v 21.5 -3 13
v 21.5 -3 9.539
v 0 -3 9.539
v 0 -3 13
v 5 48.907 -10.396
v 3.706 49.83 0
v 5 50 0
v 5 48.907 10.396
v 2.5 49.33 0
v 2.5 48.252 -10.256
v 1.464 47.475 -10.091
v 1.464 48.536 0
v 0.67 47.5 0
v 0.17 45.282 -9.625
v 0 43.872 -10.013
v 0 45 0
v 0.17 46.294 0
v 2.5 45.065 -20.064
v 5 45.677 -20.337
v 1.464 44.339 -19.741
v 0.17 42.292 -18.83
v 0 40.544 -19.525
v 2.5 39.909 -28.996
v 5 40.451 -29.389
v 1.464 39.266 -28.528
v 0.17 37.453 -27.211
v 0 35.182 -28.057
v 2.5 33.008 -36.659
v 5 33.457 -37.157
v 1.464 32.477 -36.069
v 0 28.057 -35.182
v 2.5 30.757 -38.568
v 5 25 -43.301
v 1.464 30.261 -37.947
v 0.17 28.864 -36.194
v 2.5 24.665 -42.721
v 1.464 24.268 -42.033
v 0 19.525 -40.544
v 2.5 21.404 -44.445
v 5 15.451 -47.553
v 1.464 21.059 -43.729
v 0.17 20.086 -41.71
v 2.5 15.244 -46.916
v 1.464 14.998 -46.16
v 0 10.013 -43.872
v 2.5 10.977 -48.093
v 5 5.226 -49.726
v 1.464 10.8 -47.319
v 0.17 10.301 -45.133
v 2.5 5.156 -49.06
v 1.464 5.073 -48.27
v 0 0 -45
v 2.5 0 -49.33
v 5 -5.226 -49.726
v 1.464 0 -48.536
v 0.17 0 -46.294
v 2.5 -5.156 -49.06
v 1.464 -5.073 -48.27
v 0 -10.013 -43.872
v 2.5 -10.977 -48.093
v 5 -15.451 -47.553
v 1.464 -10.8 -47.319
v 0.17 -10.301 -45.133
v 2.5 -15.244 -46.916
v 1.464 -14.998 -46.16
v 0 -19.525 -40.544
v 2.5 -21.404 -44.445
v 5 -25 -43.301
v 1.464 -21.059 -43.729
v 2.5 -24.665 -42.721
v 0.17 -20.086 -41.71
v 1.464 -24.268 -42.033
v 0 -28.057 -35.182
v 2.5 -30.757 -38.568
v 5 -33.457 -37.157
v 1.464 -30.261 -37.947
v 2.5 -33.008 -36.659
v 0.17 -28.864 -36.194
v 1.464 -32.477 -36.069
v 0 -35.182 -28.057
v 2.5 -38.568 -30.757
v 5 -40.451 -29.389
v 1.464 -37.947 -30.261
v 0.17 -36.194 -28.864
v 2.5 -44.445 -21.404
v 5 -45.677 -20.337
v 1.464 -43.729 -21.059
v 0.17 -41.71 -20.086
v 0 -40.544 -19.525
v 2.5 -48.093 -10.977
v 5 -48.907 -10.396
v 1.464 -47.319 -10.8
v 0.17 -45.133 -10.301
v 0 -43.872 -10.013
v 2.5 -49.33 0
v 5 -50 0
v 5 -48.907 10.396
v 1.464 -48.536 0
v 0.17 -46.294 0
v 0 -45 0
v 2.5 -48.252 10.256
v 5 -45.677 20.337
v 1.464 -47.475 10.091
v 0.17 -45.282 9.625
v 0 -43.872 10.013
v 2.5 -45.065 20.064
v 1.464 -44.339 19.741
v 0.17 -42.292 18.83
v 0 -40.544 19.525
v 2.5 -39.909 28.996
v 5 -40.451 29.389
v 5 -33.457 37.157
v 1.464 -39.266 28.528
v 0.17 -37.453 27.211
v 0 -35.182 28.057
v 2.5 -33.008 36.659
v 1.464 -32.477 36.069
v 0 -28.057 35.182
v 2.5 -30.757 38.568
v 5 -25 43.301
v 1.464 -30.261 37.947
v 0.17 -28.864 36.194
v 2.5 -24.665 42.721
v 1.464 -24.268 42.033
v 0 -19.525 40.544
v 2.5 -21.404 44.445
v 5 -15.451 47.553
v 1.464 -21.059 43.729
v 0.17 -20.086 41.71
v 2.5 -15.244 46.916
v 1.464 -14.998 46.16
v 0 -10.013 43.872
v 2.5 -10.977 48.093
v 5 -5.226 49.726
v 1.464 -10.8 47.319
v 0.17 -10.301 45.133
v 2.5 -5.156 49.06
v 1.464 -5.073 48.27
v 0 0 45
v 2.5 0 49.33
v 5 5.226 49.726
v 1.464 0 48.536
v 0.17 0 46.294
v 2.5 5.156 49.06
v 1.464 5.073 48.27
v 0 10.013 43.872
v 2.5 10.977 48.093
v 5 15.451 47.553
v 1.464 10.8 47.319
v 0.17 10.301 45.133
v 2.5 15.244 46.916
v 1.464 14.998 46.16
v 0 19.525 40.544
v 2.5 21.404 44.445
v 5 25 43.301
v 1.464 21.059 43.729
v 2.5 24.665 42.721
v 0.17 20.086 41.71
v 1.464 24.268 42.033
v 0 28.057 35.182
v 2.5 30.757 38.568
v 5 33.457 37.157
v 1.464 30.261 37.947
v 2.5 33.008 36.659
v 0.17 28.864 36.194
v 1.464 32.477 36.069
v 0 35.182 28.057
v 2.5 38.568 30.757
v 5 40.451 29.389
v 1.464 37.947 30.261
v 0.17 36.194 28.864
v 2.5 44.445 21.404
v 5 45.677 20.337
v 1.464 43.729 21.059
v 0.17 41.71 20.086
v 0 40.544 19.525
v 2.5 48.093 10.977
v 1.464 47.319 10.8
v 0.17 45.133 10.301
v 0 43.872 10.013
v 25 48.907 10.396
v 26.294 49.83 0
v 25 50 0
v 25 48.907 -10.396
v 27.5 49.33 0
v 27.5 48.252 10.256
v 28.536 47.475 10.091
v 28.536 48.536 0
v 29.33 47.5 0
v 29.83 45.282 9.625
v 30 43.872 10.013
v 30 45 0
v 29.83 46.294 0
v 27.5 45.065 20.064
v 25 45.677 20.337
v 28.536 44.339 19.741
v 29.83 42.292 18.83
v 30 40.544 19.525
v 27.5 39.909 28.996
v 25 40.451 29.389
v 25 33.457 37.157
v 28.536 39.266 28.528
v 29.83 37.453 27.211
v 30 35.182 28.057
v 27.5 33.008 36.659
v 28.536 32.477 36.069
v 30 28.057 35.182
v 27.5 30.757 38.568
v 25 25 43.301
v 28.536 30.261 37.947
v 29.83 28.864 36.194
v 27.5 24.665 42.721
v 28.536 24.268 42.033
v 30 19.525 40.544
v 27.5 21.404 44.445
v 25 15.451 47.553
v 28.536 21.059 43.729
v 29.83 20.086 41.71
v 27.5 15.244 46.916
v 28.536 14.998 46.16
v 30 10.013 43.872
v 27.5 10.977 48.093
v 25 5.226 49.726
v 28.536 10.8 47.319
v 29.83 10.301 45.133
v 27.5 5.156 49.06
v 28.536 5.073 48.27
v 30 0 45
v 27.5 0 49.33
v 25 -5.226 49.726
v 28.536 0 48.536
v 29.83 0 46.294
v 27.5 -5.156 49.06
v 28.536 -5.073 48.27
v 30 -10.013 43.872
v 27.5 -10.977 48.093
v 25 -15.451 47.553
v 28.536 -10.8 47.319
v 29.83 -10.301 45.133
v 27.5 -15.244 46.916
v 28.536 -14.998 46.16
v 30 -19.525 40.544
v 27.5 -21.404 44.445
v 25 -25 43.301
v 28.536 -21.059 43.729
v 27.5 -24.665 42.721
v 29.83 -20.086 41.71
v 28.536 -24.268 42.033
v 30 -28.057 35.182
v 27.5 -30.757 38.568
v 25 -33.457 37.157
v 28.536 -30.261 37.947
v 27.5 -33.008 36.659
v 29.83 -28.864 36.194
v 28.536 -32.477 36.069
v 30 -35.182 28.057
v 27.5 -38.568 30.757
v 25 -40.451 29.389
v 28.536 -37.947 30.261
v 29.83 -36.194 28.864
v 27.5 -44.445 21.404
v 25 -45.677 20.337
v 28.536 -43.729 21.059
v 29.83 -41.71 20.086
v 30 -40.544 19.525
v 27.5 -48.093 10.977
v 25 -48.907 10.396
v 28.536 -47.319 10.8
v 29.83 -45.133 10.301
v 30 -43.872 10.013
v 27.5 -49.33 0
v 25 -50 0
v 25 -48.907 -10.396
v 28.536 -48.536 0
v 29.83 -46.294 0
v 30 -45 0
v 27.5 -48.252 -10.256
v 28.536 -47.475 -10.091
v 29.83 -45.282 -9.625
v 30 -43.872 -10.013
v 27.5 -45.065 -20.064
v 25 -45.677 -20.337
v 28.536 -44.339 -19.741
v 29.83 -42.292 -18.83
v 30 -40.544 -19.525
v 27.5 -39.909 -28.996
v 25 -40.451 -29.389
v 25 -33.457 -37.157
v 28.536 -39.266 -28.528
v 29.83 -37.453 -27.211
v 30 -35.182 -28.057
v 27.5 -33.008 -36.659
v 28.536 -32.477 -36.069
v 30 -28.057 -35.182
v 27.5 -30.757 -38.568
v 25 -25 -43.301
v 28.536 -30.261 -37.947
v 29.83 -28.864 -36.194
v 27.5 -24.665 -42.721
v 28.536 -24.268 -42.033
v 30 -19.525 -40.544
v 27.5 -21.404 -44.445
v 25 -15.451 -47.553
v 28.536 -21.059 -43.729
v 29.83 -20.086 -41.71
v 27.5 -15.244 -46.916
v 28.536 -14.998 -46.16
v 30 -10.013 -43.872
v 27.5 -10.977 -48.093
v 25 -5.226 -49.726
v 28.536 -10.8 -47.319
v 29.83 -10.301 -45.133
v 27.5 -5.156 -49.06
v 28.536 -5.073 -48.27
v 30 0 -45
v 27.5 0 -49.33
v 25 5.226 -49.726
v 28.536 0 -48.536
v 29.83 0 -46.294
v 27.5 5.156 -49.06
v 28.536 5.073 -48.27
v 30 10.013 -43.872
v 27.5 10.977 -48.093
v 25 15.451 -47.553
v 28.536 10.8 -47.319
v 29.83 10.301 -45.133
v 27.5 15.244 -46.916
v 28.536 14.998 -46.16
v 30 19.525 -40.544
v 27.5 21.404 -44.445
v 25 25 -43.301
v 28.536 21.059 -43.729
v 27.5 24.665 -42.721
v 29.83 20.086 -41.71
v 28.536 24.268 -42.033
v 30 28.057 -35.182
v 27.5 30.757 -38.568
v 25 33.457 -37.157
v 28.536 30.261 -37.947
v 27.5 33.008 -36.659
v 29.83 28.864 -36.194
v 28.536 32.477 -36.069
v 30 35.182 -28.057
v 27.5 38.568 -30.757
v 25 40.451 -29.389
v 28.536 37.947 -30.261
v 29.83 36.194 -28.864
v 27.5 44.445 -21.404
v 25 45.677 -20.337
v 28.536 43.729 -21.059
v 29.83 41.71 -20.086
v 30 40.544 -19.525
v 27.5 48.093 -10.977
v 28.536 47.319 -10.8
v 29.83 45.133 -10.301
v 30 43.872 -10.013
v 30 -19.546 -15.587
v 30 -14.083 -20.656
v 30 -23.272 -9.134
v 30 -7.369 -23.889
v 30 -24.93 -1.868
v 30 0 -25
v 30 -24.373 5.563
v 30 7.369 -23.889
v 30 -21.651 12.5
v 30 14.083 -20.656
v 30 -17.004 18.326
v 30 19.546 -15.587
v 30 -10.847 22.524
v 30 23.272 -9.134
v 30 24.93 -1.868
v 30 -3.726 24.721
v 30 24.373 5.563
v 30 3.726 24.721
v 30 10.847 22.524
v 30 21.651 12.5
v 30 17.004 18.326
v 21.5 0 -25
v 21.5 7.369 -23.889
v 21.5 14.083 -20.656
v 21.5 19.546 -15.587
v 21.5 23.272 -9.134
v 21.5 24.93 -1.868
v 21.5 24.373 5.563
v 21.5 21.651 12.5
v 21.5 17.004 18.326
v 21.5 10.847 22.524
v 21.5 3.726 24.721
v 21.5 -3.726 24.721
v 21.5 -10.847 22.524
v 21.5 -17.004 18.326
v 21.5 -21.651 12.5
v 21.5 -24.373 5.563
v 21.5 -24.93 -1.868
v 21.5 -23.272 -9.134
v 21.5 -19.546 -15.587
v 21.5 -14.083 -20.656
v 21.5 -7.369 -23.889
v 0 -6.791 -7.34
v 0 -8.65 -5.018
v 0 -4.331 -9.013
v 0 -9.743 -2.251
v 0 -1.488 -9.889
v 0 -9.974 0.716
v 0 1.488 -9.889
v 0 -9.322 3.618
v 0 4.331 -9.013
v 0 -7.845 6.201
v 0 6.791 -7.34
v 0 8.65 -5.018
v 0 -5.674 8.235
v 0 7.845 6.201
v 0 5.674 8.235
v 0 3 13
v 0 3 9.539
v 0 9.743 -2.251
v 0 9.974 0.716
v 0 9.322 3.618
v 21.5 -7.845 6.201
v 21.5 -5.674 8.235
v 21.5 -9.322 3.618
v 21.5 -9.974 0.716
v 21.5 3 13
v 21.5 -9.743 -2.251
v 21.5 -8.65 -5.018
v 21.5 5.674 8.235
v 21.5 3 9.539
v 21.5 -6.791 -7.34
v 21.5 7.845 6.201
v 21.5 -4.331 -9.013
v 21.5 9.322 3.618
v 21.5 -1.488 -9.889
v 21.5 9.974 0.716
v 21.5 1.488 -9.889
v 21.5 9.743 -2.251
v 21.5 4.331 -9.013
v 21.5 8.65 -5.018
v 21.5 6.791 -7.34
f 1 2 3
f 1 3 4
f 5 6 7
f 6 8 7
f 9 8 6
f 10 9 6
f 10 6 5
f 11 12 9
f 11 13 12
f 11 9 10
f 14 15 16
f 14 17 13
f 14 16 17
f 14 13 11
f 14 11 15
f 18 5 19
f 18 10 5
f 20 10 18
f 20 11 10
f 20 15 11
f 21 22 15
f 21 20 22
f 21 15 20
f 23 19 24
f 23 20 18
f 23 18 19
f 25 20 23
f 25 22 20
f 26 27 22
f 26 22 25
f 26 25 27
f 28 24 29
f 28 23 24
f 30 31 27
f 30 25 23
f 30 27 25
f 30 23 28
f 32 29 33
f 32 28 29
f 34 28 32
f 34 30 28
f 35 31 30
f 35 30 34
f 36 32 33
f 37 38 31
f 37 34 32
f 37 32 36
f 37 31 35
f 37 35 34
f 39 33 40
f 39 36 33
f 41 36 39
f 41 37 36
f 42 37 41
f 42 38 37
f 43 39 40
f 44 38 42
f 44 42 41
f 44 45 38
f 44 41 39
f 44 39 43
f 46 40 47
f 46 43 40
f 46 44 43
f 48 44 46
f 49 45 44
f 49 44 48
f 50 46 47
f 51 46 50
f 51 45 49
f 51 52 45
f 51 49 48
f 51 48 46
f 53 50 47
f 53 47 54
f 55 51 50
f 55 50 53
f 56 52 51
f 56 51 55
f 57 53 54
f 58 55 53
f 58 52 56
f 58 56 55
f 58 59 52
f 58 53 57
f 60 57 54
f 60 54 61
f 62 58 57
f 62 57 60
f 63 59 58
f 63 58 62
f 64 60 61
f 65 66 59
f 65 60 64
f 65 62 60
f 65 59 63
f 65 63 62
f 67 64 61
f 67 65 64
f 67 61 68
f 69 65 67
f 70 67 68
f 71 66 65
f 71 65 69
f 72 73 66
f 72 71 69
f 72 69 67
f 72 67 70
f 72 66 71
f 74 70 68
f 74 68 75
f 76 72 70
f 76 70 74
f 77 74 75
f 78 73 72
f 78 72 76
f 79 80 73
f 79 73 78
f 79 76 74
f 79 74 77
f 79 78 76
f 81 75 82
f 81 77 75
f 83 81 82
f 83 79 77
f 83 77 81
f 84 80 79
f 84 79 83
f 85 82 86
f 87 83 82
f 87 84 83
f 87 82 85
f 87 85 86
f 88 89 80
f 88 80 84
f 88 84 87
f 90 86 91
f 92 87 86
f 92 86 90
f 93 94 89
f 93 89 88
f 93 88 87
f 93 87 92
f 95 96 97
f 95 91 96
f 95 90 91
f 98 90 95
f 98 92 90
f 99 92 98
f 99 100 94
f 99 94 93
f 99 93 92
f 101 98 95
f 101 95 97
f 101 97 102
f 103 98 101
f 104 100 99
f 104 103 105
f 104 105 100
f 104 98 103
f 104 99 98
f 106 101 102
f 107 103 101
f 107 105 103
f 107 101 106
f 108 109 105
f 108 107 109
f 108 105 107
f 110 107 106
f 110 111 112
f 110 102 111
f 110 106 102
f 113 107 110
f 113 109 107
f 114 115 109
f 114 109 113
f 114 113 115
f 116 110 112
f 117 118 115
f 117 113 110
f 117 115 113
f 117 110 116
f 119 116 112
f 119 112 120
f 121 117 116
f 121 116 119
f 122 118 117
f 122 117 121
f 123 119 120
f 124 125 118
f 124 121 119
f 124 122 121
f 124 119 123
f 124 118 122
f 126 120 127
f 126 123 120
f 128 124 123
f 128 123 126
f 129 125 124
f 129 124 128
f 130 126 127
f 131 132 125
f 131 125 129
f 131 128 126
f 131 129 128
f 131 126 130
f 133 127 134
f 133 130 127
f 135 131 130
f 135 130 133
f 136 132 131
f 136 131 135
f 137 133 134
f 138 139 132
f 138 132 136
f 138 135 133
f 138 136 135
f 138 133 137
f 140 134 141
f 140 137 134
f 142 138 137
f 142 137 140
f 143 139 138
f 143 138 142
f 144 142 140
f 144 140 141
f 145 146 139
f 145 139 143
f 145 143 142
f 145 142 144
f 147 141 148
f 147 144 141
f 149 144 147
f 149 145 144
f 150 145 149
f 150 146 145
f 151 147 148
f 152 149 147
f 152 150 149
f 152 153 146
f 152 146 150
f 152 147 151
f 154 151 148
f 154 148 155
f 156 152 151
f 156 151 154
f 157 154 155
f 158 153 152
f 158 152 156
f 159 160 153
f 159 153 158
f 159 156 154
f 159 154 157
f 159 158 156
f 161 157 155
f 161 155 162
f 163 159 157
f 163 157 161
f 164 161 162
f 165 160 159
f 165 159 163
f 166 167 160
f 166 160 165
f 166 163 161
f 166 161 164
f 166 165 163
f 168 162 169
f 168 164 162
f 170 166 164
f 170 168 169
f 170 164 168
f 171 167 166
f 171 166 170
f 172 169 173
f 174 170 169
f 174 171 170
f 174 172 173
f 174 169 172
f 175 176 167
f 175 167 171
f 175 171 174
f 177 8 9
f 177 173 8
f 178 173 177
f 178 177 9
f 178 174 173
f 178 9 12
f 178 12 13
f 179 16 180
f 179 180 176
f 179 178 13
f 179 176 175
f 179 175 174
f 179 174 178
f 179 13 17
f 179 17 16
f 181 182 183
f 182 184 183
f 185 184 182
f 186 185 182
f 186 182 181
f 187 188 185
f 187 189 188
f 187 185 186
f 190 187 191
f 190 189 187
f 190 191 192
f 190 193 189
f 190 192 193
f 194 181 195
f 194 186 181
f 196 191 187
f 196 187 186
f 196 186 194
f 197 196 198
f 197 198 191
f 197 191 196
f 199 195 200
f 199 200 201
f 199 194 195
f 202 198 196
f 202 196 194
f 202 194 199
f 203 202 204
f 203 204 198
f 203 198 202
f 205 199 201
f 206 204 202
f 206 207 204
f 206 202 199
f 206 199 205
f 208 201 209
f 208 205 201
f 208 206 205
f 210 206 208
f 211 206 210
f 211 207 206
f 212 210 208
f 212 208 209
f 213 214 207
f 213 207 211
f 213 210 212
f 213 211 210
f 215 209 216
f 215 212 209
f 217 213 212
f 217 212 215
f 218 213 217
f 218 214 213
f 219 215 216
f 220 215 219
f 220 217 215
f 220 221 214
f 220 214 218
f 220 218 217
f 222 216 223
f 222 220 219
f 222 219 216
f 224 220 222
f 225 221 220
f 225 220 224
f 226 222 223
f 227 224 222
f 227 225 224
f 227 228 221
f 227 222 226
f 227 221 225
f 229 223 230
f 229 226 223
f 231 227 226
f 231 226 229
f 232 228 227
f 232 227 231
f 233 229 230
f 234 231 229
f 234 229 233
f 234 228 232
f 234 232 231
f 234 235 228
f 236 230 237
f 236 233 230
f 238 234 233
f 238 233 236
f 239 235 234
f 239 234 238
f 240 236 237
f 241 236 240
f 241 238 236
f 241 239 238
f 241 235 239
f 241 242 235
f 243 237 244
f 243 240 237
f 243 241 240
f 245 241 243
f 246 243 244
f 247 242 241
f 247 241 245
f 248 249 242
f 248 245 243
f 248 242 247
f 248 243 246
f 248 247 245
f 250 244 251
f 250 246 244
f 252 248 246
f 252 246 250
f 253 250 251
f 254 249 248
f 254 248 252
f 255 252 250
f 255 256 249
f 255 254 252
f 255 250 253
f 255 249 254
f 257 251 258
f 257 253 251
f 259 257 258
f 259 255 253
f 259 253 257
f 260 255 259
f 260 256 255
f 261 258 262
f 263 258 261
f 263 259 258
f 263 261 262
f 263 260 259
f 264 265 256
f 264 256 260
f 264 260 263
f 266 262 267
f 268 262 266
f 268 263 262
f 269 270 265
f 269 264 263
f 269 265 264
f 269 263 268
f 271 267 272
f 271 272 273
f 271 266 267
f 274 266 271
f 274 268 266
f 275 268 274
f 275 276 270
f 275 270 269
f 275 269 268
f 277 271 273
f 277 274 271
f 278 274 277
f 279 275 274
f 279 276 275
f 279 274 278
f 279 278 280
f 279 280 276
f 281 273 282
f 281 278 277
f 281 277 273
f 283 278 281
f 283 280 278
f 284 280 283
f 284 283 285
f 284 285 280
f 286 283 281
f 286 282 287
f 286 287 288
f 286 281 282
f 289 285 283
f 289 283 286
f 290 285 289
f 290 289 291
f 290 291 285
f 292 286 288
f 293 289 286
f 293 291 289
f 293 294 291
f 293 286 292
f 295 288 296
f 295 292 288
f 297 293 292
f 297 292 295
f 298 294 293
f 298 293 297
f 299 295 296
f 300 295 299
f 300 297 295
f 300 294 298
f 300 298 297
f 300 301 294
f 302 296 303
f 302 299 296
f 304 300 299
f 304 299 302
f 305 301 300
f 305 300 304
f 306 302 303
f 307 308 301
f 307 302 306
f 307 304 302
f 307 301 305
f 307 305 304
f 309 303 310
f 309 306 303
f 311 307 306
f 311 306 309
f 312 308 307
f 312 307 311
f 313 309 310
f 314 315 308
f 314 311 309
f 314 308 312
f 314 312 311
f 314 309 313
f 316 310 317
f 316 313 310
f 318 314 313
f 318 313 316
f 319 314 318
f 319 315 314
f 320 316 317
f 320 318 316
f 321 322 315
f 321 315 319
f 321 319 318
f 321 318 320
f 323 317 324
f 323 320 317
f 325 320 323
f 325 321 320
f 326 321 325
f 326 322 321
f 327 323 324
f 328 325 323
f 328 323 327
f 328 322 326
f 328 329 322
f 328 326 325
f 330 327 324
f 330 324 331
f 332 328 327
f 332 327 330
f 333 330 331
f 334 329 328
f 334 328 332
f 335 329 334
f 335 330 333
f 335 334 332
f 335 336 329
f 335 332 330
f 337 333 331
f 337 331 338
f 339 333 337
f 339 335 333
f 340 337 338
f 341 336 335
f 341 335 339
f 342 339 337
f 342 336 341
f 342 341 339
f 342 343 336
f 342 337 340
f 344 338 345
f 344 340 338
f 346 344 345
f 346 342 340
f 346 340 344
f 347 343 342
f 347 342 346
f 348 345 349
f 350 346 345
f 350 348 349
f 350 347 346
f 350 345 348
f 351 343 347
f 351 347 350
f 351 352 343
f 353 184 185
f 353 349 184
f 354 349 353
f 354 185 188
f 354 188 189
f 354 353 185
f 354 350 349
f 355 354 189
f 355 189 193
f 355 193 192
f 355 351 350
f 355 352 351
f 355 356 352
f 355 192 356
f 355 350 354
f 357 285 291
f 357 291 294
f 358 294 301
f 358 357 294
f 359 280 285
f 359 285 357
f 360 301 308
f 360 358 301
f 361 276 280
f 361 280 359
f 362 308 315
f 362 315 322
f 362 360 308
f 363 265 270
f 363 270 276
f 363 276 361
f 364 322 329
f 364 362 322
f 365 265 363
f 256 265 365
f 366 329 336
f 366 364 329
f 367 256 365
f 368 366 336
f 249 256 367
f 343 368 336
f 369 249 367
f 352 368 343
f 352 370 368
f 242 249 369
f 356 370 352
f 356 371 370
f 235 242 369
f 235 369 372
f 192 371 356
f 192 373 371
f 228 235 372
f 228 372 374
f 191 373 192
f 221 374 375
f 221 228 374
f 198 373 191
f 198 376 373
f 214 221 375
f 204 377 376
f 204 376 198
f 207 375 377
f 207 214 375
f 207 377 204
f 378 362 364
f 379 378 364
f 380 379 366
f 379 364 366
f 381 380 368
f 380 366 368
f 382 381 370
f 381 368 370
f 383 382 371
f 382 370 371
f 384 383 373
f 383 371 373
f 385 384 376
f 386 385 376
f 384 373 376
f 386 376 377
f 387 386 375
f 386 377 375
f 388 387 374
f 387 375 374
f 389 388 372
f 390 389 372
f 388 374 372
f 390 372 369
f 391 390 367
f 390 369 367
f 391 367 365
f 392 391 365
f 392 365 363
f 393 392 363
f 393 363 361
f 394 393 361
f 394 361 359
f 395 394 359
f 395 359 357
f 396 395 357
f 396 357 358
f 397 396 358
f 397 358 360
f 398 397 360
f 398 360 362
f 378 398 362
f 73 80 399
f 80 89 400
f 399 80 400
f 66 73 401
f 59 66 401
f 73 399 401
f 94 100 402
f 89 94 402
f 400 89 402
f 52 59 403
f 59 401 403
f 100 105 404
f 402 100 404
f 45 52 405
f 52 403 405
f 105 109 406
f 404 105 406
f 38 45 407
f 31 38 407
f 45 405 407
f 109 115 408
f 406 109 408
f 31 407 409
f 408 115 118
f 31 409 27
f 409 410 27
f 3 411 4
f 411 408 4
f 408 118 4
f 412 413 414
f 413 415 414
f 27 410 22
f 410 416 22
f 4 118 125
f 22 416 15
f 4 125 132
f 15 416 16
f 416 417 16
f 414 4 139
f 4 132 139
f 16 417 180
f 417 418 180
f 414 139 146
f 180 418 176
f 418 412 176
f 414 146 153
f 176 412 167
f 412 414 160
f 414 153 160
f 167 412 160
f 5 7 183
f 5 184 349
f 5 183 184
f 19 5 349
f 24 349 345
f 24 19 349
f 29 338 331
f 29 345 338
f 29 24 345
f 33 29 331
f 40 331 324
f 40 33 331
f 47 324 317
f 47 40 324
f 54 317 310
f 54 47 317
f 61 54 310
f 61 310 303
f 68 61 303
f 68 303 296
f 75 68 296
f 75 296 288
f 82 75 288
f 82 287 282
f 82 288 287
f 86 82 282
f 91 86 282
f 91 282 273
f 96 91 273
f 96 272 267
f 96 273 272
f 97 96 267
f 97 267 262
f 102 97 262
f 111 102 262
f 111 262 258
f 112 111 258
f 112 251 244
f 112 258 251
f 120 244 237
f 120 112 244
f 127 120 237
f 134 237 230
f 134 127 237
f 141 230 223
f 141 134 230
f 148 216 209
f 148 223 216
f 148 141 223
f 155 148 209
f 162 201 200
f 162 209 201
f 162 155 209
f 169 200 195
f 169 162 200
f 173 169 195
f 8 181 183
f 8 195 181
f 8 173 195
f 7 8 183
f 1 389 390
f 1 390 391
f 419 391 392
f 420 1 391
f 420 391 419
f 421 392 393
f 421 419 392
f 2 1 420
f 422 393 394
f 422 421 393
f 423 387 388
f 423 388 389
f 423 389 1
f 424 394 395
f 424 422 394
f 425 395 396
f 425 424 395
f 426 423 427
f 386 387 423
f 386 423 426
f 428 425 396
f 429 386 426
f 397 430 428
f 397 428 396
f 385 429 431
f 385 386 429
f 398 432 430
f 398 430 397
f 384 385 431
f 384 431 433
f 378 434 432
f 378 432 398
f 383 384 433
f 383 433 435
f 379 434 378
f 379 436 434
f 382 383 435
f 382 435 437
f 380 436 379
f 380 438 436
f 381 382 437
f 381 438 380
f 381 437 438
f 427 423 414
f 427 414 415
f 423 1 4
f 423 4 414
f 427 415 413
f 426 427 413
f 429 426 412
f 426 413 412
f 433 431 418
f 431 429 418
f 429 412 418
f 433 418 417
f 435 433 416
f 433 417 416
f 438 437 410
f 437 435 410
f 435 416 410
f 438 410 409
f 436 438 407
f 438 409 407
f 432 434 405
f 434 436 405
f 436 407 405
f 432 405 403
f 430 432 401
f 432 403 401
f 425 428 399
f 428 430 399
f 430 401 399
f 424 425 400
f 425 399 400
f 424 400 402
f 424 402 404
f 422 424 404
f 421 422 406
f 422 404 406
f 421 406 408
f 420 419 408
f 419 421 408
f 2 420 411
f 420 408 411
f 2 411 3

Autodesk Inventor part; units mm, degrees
ref_plane "YZ Plane" through (0, 0, 0) normal (1, 0, 0) x (0, 1, 0)
ref_plane "XZ Plane" through (0, 0, 0) normal (0, 1, 0) x (-1, 0, 0)
ref_plane "XY Plane" through (0, 0, 0) normal (0, 0, 1) x (1, 0, 0)
sketch "Sketch1" plane through (0, 0, 0) normal (1, 0, 0) x (0, 1, 0)
  circle A0 centre (0, 0) radius 50
  dimension "d0" = 100
extrude "Extrusion1" add sketch "Sketch1" along normal blind 30
fillet "Fillet1" radius 5 2 edges at (30, -50, 0) (0, -50, 0)
sketch "Sketch2" plane through (30, 0, 0) normal (1, 0, 0) x (0, 0, -1)
  circle A0 centre (0, 0) radius 50 projected
hole "Hole1" at (30, 0, 0) direction (-1, 0, 0) diameter 20 end through all
sketch "Sketch3" plane through (30, 0, 0) normal (1, 0, 0) x (0, 0, -1)
  circle A0 centre (0, 0) radius 25
  dimension "d11" = 50
extrude "Extrusion2" cut sketch "Sketch3" against normal blind 8.5
sketch "Sketch4" plane through (21.5, 0, 0) normal (1, 0, 0) x (0, 0, -1)
  line L0 (-7, -3) -> (-13, -3)
  line L1 (-13, -3) -> (-13, 3)
  line L2 (-13, 3) -> (-7, 3)
  line L3 (-7, 3) -> (-7, -3)
  circle A0 centre (0, 0) radius 10 projected
  line L4 (-7, -3) -> (-13, 3) construction
  line L5 (-13, -3) -> (-7, 3) construction
  point P0 (-10, 0)
  dimension "d14" = 6
  dimension "d15" = 6
extrude "Extrusion3" cut sketch "Sketch4" against normal blind 28 contours L0 A0 L2 L3 | L0 L1 L2 A0 picked at (-7.9828, 0.338)
properties part number "100mm Traction Wheel StandIn" material "Rubber"
